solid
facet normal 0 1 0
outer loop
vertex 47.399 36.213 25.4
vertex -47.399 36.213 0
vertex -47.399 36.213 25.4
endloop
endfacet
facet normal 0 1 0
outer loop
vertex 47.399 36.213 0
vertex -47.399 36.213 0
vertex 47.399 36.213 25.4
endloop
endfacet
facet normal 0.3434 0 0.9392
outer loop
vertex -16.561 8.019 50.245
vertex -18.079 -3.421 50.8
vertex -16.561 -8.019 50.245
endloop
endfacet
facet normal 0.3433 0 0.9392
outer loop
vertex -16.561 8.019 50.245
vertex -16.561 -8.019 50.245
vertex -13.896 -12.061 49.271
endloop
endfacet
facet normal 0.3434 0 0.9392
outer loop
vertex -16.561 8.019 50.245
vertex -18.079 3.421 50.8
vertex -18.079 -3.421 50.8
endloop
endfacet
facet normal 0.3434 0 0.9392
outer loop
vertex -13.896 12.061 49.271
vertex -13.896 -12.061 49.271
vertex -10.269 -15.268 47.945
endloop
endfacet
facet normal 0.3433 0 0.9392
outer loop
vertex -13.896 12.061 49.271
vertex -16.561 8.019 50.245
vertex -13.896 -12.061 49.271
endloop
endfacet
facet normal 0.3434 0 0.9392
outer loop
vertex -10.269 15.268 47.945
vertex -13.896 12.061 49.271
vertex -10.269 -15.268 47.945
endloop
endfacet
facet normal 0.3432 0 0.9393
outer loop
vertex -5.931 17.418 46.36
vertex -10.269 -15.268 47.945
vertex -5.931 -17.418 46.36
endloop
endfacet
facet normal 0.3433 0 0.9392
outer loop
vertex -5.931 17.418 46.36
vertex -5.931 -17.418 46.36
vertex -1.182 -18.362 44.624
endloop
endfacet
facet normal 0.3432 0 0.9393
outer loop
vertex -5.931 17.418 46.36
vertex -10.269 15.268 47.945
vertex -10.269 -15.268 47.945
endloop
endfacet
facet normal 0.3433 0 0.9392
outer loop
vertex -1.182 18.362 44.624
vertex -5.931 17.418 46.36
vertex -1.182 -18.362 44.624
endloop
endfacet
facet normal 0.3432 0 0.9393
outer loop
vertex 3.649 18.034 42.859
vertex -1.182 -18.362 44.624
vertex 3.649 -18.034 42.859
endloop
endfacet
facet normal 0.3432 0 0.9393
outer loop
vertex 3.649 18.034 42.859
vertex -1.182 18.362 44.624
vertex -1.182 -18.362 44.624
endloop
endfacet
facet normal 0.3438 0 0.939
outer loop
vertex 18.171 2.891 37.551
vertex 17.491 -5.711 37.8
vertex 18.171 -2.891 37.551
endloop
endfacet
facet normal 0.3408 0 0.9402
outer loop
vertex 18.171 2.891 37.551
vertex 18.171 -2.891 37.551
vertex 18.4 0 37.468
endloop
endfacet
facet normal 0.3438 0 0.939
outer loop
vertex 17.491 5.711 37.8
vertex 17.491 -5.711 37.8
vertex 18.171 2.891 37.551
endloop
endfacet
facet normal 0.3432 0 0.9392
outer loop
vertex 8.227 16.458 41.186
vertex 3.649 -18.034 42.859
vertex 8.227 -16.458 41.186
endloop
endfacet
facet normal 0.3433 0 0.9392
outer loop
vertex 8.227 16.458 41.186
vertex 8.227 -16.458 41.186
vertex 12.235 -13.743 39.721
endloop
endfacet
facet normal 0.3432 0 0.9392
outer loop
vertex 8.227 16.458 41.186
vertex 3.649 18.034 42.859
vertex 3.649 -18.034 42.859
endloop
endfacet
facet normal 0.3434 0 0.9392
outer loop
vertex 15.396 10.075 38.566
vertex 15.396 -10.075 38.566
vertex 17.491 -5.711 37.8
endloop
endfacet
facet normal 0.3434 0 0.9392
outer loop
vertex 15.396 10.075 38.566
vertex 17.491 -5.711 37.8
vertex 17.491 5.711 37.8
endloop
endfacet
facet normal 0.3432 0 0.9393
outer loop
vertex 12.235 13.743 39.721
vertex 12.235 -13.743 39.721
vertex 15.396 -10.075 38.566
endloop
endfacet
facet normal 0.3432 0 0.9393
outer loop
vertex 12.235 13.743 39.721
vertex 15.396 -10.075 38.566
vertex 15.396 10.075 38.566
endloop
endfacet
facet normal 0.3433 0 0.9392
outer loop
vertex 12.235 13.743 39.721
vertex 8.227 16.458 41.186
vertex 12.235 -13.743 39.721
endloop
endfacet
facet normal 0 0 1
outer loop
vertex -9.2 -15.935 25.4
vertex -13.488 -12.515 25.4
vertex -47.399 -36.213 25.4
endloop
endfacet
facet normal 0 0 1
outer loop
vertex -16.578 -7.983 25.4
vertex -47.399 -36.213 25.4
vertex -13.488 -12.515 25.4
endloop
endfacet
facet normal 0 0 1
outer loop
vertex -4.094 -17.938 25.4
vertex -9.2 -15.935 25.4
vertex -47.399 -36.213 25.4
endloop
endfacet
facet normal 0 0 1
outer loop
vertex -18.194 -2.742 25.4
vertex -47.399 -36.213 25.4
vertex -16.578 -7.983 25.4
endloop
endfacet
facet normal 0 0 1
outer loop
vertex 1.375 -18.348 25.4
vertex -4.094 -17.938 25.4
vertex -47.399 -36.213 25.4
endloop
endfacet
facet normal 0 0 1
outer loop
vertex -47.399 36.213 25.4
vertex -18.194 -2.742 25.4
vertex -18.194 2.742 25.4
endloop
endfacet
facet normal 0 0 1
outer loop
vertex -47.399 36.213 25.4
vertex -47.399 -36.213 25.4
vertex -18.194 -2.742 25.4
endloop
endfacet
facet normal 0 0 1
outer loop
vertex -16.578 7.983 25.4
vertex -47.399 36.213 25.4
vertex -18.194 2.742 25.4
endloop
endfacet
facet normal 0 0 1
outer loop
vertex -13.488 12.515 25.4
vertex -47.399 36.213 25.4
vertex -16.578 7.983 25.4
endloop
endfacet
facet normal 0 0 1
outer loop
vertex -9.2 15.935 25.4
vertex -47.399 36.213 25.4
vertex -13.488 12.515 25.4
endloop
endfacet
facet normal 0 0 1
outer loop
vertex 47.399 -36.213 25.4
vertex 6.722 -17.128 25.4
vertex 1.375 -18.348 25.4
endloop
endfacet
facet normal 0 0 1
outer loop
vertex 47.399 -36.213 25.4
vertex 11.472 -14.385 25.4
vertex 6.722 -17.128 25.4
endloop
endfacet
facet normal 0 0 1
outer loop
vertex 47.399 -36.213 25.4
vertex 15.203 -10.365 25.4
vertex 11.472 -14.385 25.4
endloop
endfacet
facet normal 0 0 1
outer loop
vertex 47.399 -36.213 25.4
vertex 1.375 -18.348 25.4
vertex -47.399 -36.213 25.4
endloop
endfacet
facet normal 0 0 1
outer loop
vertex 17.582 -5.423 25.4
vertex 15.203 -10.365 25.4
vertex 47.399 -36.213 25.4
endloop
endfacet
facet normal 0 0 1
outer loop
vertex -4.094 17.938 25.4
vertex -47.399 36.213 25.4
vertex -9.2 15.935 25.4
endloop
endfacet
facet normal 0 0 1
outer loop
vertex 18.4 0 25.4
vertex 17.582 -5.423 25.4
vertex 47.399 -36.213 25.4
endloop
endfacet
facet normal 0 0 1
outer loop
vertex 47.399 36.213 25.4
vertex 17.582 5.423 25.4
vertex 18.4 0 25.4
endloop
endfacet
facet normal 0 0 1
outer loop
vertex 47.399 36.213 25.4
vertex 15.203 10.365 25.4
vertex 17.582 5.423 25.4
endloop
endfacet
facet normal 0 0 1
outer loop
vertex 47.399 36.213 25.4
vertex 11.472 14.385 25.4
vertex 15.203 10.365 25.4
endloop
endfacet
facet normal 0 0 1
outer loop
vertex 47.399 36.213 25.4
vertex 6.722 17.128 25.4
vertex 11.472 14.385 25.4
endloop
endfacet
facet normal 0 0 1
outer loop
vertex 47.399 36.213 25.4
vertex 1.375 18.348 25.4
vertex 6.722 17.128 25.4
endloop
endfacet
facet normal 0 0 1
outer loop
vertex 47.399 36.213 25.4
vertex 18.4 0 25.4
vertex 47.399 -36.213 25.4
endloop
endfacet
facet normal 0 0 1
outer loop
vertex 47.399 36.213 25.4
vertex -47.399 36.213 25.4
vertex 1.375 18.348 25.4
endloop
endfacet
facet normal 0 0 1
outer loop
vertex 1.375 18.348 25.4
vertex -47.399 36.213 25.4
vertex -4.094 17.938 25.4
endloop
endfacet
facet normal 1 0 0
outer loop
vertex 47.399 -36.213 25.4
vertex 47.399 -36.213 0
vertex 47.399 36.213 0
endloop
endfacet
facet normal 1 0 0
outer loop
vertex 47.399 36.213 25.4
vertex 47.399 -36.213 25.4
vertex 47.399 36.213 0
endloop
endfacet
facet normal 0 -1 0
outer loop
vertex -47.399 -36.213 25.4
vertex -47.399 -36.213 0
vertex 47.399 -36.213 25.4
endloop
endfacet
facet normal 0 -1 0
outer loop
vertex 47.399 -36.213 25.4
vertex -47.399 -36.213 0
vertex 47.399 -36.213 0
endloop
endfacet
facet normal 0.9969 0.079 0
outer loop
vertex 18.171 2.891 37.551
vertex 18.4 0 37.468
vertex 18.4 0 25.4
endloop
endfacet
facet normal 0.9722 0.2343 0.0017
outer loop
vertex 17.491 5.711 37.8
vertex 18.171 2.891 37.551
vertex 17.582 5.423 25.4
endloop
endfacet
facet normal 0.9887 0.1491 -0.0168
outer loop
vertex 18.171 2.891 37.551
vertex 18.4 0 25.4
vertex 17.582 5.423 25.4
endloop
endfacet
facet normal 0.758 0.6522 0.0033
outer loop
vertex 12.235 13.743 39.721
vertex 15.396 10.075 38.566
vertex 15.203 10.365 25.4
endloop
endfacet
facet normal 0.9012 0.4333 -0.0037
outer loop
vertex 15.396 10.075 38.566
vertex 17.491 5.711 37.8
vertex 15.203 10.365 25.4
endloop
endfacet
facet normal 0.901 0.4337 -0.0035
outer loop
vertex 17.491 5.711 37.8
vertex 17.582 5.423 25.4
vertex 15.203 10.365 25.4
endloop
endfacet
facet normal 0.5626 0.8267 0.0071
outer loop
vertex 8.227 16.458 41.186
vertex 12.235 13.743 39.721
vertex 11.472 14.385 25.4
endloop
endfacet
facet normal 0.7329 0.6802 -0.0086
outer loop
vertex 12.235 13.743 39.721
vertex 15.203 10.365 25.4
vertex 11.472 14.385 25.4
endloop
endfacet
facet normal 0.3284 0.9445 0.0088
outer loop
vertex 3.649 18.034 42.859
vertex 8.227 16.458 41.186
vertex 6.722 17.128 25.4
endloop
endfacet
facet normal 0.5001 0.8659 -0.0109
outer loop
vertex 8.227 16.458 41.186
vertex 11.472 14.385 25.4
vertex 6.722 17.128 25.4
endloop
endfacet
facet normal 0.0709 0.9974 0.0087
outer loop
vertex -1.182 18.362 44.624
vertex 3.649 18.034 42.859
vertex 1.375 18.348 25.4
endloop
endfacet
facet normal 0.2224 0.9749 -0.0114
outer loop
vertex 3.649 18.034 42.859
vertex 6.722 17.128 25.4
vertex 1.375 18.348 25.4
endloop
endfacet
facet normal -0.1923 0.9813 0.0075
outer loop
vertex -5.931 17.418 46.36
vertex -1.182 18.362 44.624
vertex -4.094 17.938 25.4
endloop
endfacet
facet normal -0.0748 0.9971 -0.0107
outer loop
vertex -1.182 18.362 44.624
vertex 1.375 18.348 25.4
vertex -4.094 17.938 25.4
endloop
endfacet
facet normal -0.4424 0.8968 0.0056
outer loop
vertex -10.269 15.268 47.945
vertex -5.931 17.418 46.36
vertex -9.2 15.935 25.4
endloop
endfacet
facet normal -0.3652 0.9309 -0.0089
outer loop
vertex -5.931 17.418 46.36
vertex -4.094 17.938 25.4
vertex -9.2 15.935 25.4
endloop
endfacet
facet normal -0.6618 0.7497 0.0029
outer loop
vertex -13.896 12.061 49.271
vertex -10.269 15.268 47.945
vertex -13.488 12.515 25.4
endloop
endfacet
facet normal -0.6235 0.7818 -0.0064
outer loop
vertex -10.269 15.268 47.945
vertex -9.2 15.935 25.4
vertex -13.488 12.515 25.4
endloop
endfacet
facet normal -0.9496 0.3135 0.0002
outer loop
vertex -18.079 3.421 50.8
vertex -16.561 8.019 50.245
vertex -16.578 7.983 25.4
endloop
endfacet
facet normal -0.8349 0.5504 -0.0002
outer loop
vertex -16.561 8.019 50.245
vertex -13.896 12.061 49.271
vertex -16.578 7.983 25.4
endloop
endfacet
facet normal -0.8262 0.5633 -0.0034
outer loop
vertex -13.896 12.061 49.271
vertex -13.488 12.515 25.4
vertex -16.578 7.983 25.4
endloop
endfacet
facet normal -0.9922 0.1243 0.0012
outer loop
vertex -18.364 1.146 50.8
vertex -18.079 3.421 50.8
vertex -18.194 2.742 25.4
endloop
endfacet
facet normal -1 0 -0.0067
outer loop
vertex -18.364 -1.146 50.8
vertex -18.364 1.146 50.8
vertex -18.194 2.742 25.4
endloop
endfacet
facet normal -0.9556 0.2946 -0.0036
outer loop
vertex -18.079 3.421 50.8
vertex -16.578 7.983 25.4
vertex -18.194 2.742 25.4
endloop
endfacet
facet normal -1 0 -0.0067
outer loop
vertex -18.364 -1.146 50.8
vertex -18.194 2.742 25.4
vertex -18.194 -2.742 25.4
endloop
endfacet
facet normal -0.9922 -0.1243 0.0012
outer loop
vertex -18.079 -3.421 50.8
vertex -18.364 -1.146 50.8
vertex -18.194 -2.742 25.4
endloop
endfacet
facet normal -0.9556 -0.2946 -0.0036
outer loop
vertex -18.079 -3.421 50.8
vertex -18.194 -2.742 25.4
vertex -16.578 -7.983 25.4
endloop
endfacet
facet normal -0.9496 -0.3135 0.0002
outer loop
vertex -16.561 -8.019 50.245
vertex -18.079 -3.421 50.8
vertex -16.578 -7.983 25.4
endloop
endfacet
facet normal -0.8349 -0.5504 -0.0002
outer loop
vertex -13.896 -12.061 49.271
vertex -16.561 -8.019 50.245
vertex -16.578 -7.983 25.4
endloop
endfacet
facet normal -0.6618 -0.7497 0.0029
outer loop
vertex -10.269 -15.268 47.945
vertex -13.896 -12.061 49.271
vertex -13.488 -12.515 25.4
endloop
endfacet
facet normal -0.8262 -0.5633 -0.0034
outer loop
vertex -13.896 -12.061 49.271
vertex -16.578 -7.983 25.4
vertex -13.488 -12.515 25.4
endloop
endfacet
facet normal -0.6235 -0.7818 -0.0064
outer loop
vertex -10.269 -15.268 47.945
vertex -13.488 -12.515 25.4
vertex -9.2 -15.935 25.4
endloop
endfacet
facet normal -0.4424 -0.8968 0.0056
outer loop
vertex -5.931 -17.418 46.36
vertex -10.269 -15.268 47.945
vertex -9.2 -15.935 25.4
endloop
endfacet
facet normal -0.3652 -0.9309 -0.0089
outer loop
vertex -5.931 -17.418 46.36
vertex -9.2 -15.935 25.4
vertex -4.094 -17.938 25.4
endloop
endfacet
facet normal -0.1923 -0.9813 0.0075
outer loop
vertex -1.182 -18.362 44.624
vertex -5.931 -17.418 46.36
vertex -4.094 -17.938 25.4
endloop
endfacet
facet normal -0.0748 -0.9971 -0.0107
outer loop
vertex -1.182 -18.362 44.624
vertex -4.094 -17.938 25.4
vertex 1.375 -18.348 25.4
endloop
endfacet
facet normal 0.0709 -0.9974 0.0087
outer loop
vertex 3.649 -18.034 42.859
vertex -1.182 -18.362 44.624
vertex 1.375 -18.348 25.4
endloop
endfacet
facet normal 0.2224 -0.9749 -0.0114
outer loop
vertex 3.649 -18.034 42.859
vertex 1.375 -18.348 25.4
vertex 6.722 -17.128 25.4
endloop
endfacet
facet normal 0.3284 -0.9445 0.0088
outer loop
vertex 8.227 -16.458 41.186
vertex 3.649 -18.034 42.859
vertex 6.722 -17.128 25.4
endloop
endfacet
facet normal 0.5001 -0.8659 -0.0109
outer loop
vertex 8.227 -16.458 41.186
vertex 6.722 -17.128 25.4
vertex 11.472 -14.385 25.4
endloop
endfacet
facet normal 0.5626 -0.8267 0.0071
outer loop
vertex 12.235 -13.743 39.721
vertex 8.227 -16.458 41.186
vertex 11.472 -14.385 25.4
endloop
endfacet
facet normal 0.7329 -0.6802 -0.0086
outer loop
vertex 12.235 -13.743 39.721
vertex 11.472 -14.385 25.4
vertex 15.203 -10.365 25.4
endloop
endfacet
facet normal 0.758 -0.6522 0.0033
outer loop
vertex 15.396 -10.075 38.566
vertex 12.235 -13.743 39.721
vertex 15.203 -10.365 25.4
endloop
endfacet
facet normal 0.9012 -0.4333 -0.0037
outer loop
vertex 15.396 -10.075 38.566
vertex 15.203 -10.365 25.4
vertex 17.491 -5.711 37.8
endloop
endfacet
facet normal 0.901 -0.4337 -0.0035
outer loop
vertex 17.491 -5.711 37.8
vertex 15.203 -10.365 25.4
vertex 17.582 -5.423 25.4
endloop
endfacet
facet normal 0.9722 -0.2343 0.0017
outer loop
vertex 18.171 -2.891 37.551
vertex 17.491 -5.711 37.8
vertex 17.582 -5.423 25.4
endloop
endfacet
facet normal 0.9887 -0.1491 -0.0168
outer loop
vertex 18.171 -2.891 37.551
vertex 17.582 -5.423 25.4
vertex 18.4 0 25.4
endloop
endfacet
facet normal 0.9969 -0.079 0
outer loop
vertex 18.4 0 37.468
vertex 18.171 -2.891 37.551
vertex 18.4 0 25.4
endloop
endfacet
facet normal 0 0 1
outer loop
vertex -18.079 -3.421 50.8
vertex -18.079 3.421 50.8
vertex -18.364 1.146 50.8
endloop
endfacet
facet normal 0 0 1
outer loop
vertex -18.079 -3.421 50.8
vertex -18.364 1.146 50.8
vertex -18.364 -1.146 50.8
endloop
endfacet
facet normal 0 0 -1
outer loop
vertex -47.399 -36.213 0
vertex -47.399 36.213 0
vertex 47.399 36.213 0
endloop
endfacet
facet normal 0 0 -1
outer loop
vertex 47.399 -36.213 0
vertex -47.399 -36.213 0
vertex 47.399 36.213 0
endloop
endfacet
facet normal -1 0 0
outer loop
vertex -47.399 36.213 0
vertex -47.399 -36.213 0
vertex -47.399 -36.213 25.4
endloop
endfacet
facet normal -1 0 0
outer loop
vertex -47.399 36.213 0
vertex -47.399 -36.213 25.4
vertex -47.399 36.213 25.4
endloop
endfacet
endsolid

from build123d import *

# Parameters (mm, degrees)
F0_W          = 94.798579812
F0_H          = 72.4261179566
F1_DEPTH      = 25.4
F2_R          = 18.3997173806
F3_DEPTH      = 25.4
F5_DEPTH      = 36.2140589783
F5_DEPTH_BACK = 36.2140589783


with BuildPart() as f1:
    # F0 (on Top) → F1 (new body)
    with BuildSketch(Plane.XY):
        Rectangle(F0_W, F0_H)
    extrude(amount=F1_DEPTH)

    # F2 (on face) → F3 (join)
    with BuildSketch(Plane.XY.offset(25.4)):
        Circle(F2_R)
    extrude(amount=F3_DEPTH)

    # F4 (on Front) → F5 (cut, two sides)
    with BuildSketch(Plane.XZ) as f5_sk:
        Polygon((19.6720566601, 52.7677323434), (-19.1493127495, 51.1912330985), (19.6720566601, 37.0027127904), align=None)
    extrude(amount=-F5_DEPTH, mode=Mode.SUBTRACT)
    extrude(f5_sk.sketch, amount=F5_DEPTH_BACK, mode=Mode.SUBTRACT)


solid = f1.part
